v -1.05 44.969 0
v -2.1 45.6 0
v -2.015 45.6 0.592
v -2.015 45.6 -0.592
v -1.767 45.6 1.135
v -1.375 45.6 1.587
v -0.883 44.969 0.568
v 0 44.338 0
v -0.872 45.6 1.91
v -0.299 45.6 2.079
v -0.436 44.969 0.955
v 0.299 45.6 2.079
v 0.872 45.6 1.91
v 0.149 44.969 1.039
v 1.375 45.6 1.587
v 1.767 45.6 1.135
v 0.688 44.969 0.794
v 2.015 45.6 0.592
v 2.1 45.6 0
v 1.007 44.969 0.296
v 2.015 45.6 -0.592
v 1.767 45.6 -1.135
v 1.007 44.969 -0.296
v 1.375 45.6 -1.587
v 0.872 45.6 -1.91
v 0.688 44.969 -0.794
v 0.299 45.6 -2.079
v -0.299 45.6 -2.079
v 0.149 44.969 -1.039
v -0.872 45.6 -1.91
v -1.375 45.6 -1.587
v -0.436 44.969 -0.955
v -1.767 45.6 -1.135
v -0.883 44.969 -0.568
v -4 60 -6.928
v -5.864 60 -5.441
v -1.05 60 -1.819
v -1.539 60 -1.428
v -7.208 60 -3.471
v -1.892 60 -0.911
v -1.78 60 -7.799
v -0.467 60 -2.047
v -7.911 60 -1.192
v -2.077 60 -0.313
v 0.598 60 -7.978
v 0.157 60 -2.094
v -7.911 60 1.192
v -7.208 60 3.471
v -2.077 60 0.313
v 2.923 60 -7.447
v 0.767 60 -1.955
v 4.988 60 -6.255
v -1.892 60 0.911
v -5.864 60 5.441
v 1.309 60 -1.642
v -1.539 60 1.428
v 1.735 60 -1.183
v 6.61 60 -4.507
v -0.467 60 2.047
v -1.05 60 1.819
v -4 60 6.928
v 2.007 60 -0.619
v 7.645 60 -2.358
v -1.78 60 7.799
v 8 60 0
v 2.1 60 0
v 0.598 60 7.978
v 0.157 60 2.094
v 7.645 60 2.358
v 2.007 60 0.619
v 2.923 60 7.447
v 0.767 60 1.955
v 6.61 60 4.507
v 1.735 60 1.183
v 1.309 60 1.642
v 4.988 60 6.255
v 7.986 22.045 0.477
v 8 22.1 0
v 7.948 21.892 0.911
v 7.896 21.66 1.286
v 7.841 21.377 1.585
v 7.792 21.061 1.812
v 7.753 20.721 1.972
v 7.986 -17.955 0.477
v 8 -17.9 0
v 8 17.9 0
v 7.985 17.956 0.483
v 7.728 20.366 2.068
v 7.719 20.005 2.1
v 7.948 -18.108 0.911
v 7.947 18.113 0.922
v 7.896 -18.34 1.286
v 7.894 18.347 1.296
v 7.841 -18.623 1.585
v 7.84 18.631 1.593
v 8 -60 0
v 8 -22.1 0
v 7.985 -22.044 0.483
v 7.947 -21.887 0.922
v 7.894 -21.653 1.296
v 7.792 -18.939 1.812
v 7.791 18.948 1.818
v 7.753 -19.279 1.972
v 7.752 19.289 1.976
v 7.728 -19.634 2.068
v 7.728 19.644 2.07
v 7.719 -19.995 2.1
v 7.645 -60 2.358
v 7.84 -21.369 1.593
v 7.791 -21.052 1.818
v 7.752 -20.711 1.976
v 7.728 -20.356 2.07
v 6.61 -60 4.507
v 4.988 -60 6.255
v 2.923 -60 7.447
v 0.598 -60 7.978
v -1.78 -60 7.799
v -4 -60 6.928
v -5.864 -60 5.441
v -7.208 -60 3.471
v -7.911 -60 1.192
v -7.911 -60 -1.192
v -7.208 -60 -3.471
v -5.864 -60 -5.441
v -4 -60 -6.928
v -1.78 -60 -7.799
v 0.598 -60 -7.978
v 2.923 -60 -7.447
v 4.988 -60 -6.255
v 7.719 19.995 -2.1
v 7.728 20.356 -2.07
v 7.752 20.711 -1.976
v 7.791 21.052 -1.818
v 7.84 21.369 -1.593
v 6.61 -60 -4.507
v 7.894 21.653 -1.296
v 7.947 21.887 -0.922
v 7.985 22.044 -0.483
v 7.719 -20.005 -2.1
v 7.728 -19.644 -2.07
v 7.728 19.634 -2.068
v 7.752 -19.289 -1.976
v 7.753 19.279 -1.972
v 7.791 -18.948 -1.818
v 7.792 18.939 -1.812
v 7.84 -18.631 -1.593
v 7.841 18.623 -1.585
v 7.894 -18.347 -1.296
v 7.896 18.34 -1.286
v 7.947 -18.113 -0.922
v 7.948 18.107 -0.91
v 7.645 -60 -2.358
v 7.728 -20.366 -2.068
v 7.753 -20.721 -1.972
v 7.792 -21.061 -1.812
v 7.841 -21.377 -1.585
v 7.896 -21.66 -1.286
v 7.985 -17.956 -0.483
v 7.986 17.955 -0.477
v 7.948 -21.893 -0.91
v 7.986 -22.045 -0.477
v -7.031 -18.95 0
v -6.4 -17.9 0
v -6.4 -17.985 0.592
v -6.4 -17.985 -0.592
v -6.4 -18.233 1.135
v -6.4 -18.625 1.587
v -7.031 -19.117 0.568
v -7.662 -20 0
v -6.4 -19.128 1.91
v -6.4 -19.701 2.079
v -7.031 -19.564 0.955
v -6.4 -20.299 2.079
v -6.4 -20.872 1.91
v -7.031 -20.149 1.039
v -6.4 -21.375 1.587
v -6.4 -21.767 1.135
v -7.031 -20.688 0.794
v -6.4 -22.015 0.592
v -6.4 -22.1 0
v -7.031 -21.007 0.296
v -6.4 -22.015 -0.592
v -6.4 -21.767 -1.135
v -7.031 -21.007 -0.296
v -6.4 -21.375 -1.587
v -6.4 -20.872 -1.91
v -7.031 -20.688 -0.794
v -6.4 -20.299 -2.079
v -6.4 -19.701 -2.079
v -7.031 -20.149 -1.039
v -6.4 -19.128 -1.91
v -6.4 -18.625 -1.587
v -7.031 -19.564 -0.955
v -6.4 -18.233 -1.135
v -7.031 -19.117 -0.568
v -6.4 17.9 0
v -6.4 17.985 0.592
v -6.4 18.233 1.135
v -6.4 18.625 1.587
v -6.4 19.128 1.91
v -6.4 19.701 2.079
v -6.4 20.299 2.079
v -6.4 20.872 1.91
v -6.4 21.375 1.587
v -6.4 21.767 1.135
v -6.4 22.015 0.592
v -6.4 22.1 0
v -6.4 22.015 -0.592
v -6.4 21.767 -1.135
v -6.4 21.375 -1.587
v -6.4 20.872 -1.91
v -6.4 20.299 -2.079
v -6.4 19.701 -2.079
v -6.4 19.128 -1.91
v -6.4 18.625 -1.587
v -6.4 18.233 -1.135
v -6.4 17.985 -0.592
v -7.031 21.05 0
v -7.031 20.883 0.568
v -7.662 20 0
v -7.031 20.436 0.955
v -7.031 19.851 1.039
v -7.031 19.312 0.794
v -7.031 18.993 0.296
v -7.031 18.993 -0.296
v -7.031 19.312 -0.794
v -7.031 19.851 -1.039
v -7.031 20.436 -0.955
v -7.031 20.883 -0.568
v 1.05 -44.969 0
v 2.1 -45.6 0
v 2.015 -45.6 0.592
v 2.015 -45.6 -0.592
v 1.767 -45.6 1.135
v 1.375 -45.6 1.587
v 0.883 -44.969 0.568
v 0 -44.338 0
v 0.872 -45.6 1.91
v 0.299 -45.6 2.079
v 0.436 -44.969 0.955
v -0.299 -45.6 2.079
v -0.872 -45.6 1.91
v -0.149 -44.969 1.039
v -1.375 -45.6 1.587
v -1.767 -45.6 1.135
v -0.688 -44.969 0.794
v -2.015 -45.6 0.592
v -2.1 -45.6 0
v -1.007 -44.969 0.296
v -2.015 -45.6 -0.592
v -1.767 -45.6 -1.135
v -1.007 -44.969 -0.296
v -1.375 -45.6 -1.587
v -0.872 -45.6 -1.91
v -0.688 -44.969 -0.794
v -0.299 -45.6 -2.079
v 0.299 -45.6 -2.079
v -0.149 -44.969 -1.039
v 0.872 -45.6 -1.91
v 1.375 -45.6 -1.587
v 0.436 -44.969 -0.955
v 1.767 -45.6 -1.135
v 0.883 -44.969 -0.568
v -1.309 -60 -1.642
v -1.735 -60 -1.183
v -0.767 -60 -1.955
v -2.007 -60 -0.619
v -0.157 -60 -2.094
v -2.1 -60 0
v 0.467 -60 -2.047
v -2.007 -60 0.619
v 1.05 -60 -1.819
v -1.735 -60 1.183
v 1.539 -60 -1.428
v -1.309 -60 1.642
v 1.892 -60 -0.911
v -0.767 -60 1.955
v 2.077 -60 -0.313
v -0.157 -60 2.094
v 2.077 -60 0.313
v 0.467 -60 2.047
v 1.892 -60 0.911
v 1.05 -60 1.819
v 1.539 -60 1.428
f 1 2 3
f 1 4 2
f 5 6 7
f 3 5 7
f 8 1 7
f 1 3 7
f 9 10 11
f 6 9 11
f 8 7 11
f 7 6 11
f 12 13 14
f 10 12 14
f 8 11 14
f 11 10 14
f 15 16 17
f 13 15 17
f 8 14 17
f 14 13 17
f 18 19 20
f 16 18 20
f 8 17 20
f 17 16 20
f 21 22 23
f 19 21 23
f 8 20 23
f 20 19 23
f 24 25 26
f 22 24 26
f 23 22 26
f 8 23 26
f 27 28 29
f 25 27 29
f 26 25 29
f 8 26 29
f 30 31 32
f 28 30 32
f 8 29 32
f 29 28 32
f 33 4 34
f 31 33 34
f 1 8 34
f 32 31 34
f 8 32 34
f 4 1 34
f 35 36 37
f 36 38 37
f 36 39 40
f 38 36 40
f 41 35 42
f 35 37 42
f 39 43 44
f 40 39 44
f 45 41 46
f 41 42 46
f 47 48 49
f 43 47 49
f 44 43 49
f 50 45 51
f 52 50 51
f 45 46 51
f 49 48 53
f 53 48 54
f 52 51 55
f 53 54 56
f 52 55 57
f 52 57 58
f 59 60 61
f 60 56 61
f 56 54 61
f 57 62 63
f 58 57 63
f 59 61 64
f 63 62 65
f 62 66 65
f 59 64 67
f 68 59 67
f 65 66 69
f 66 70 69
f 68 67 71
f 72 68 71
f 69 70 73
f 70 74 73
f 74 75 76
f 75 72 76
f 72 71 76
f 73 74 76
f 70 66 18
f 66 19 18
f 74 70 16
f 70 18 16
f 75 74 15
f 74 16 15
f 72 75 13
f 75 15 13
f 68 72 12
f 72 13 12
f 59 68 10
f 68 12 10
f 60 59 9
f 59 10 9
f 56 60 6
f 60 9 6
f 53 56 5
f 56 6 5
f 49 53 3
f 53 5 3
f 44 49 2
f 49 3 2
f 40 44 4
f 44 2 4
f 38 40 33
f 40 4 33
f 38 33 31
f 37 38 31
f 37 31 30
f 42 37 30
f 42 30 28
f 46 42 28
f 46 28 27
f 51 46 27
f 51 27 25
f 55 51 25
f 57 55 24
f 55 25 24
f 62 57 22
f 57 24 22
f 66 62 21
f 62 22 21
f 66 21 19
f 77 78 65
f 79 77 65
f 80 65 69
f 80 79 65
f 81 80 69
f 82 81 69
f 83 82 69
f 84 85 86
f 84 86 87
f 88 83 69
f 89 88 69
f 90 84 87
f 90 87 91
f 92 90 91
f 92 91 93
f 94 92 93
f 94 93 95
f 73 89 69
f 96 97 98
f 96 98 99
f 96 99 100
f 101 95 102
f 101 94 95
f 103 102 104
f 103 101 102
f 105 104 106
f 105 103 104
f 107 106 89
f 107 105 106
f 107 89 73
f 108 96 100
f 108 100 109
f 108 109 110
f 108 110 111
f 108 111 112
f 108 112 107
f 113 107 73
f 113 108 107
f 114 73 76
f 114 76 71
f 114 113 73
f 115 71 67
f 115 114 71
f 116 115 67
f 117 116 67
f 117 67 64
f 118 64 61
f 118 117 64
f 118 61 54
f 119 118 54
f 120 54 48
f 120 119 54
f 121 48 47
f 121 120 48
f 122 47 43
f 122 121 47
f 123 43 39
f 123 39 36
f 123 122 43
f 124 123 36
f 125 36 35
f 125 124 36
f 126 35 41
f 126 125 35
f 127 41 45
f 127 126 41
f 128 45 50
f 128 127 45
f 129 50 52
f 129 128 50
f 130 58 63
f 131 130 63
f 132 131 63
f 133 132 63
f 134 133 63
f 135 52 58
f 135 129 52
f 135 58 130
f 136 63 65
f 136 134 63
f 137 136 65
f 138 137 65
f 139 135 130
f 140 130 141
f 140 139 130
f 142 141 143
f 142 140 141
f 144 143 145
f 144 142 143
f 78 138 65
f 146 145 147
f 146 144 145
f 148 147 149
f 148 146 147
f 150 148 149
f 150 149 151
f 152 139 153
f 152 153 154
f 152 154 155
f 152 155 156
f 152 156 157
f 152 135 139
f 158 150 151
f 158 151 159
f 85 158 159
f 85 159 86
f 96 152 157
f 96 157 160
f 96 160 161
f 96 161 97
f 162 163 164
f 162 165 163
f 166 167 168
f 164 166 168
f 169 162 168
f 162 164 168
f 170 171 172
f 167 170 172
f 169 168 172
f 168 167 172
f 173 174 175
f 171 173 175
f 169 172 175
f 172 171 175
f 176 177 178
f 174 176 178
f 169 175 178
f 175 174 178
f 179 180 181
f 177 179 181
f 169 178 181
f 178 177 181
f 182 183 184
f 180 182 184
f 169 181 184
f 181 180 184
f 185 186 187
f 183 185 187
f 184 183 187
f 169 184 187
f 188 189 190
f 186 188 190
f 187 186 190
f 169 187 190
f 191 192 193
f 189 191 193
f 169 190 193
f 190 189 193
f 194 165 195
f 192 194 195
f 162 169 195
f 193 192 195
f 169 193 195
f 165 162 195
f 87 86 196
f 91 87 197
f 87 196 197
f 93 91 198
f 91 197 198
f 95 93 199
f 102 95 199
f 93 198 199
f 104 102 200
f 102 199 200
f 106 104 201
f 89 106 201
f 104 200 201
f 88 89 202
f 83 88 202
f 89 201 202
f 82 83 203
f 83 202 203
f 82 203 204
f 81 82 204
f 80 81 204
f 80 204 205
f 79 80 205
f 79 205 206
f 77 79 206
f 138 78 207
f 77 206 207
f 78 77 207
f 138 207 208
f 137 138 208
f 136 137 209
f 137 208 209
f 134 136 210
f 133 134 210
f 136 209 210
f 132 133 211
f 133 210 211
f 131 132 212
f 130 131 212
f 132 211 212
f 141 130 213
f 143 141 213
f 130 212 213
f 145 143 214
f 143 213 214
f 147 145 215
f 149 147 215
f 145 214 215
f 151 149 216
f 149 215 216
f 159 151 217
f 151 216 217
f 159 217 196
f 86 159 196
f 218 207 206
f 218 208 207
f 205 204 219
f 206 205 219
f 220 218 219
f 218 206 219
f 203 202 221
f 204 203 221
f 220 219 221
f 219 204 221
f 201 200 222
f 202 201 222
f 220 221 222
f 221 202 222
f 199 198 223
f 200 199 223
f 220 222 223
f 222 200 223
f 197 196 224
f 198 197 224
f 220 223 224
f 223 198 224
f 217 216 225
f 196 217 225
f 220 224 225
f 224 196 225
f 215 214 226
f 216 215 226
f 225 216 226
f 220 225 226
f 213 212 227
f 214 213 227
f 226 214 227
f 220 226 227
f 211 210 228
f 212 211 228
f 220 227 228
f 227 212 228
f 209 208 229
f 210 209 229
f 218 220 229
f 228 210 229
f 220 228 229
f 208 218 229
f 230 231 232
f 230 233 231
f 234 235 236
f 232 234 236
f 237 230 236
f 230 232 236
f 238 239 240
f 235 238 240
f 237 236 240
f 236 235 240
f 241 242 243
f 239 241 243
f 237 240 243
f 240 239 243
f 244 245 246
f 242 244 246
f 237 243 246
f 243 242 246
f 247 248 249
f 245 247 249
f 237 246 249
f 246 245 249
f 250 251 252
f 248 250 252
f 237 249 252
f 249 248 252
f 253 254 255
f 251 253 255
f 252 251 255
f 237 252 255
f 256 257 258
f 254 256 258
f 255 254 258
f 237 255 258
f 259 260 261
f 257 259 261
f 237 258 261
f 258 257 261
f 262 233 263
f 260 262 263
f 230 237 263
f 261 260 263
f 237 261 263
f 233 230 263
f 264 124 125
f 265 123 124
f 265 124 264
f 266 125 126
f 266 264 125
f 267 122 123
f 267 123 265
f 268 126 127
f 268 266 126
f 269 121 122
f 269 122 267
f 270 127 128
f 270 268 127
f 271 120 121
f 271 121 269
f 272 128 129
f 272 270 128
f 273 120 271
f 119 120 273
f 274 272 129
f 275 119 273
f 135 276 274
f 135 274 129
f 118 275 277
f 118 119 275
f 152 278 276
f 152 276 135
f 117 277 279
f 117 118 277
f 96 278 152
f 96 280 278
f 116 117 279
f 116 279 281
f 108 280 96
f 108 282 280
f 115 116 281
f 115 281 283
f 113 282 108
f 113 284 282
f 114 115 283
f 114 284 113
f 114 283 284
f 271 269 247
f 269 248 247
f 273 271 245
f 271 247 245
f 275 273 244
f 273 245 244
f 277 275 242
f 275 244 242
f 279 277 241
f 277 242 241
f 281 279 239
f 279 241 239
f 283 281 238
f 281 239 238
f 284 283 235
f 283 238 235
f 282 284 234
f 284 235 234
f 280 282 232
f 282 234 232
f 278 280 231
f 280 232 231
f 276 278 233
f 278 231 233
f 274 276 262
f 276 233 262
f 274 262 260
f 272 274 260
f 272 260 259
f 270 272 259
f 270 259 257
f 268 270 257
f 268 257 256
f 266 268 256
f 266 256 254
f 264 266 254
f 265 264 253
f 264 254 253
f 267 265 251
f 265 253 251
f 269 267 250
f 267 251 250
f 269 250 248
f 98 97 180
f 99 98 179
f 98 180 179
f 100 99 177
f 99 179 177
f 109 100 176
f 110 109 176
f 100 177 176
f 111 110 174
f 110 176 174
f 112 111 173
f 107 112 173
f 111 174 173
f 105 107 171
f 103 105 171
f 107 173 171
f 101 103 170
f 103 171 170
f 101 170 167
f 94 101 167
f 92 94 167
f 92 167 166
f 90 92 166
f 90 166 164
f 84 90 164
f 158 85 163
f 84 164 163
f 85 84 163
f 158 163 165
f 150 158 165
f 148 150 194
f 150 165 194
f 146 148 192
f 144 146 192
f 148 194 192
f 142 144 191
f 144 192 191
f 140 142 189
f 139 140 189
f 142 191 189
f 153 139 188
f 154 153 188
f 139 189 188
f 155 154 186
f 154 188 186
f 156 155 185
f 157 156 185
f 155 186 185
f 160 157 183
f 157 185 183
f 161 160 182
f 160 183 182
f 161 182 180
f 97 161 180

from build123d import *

# Parameters (mm, degrees)
F0_R     = 8
F1_DEPTH = 60
F3_D     = 4.2
F3_DEPTH = 14.4
F3_TIP   = 1.2618073
F5_D     = 4.2
F5_DEPTH = 14.4
F5_TIP   = 1.2618073
F8_D     = 4.2
F8_DEPTH = 14.4
F8_TIP   = 1.2618073


with BuildPart() as f1:
    # F0 (on Front) → F1 (new body, symmetric)
    with BuildSketch(Plane.XZ):
        Circle(F0_R)
    extrude(amount=F1_DEPTH, both=True)

    # F3
    with Locations(Plane.XZ.offset(60)):
        with Locations((0, 0)):
            Hole(F3_D / 2, depth=F3_DEPTH)
            with Locations((0, 0, -(F3_DEPTH + F3_TIP / 2))):  # 118° drill point
                Cone(0, F3_D / 2, F3_TIP, mode=Mode.SUBTRACT)

    # F5
    with Locations(Plane(origin=(0, 60, 0), x_dir=(-1, 0, 0), z_dir=(0, 1, 0))):
        with Locations((0, 0)):
            Hole(F5_D / 2, depth=F5_DEPTH)
            with Locations((0, 0, -(F5_DEPTH + F5_TIP / 2))):  # 118° drill point
                Cone(0, F5_D / 2, F5_TIP, mode=Mode.SUBTRACT)

    # F8
    with Locations(Plane.YZ.offset(8)):
        with Locations((20, 0), (-20, 0)):
            Hole(F8_D / 2, depth=F8_DEPTH)
            with Locations((0, 0, -(F8_DEPTH + F8_TIP / 2))):  # 118° drill point
                Cone(0, F8_D / 2, F8_TIP, mode=Mode.SUBTRACT)


solid = f1.part
